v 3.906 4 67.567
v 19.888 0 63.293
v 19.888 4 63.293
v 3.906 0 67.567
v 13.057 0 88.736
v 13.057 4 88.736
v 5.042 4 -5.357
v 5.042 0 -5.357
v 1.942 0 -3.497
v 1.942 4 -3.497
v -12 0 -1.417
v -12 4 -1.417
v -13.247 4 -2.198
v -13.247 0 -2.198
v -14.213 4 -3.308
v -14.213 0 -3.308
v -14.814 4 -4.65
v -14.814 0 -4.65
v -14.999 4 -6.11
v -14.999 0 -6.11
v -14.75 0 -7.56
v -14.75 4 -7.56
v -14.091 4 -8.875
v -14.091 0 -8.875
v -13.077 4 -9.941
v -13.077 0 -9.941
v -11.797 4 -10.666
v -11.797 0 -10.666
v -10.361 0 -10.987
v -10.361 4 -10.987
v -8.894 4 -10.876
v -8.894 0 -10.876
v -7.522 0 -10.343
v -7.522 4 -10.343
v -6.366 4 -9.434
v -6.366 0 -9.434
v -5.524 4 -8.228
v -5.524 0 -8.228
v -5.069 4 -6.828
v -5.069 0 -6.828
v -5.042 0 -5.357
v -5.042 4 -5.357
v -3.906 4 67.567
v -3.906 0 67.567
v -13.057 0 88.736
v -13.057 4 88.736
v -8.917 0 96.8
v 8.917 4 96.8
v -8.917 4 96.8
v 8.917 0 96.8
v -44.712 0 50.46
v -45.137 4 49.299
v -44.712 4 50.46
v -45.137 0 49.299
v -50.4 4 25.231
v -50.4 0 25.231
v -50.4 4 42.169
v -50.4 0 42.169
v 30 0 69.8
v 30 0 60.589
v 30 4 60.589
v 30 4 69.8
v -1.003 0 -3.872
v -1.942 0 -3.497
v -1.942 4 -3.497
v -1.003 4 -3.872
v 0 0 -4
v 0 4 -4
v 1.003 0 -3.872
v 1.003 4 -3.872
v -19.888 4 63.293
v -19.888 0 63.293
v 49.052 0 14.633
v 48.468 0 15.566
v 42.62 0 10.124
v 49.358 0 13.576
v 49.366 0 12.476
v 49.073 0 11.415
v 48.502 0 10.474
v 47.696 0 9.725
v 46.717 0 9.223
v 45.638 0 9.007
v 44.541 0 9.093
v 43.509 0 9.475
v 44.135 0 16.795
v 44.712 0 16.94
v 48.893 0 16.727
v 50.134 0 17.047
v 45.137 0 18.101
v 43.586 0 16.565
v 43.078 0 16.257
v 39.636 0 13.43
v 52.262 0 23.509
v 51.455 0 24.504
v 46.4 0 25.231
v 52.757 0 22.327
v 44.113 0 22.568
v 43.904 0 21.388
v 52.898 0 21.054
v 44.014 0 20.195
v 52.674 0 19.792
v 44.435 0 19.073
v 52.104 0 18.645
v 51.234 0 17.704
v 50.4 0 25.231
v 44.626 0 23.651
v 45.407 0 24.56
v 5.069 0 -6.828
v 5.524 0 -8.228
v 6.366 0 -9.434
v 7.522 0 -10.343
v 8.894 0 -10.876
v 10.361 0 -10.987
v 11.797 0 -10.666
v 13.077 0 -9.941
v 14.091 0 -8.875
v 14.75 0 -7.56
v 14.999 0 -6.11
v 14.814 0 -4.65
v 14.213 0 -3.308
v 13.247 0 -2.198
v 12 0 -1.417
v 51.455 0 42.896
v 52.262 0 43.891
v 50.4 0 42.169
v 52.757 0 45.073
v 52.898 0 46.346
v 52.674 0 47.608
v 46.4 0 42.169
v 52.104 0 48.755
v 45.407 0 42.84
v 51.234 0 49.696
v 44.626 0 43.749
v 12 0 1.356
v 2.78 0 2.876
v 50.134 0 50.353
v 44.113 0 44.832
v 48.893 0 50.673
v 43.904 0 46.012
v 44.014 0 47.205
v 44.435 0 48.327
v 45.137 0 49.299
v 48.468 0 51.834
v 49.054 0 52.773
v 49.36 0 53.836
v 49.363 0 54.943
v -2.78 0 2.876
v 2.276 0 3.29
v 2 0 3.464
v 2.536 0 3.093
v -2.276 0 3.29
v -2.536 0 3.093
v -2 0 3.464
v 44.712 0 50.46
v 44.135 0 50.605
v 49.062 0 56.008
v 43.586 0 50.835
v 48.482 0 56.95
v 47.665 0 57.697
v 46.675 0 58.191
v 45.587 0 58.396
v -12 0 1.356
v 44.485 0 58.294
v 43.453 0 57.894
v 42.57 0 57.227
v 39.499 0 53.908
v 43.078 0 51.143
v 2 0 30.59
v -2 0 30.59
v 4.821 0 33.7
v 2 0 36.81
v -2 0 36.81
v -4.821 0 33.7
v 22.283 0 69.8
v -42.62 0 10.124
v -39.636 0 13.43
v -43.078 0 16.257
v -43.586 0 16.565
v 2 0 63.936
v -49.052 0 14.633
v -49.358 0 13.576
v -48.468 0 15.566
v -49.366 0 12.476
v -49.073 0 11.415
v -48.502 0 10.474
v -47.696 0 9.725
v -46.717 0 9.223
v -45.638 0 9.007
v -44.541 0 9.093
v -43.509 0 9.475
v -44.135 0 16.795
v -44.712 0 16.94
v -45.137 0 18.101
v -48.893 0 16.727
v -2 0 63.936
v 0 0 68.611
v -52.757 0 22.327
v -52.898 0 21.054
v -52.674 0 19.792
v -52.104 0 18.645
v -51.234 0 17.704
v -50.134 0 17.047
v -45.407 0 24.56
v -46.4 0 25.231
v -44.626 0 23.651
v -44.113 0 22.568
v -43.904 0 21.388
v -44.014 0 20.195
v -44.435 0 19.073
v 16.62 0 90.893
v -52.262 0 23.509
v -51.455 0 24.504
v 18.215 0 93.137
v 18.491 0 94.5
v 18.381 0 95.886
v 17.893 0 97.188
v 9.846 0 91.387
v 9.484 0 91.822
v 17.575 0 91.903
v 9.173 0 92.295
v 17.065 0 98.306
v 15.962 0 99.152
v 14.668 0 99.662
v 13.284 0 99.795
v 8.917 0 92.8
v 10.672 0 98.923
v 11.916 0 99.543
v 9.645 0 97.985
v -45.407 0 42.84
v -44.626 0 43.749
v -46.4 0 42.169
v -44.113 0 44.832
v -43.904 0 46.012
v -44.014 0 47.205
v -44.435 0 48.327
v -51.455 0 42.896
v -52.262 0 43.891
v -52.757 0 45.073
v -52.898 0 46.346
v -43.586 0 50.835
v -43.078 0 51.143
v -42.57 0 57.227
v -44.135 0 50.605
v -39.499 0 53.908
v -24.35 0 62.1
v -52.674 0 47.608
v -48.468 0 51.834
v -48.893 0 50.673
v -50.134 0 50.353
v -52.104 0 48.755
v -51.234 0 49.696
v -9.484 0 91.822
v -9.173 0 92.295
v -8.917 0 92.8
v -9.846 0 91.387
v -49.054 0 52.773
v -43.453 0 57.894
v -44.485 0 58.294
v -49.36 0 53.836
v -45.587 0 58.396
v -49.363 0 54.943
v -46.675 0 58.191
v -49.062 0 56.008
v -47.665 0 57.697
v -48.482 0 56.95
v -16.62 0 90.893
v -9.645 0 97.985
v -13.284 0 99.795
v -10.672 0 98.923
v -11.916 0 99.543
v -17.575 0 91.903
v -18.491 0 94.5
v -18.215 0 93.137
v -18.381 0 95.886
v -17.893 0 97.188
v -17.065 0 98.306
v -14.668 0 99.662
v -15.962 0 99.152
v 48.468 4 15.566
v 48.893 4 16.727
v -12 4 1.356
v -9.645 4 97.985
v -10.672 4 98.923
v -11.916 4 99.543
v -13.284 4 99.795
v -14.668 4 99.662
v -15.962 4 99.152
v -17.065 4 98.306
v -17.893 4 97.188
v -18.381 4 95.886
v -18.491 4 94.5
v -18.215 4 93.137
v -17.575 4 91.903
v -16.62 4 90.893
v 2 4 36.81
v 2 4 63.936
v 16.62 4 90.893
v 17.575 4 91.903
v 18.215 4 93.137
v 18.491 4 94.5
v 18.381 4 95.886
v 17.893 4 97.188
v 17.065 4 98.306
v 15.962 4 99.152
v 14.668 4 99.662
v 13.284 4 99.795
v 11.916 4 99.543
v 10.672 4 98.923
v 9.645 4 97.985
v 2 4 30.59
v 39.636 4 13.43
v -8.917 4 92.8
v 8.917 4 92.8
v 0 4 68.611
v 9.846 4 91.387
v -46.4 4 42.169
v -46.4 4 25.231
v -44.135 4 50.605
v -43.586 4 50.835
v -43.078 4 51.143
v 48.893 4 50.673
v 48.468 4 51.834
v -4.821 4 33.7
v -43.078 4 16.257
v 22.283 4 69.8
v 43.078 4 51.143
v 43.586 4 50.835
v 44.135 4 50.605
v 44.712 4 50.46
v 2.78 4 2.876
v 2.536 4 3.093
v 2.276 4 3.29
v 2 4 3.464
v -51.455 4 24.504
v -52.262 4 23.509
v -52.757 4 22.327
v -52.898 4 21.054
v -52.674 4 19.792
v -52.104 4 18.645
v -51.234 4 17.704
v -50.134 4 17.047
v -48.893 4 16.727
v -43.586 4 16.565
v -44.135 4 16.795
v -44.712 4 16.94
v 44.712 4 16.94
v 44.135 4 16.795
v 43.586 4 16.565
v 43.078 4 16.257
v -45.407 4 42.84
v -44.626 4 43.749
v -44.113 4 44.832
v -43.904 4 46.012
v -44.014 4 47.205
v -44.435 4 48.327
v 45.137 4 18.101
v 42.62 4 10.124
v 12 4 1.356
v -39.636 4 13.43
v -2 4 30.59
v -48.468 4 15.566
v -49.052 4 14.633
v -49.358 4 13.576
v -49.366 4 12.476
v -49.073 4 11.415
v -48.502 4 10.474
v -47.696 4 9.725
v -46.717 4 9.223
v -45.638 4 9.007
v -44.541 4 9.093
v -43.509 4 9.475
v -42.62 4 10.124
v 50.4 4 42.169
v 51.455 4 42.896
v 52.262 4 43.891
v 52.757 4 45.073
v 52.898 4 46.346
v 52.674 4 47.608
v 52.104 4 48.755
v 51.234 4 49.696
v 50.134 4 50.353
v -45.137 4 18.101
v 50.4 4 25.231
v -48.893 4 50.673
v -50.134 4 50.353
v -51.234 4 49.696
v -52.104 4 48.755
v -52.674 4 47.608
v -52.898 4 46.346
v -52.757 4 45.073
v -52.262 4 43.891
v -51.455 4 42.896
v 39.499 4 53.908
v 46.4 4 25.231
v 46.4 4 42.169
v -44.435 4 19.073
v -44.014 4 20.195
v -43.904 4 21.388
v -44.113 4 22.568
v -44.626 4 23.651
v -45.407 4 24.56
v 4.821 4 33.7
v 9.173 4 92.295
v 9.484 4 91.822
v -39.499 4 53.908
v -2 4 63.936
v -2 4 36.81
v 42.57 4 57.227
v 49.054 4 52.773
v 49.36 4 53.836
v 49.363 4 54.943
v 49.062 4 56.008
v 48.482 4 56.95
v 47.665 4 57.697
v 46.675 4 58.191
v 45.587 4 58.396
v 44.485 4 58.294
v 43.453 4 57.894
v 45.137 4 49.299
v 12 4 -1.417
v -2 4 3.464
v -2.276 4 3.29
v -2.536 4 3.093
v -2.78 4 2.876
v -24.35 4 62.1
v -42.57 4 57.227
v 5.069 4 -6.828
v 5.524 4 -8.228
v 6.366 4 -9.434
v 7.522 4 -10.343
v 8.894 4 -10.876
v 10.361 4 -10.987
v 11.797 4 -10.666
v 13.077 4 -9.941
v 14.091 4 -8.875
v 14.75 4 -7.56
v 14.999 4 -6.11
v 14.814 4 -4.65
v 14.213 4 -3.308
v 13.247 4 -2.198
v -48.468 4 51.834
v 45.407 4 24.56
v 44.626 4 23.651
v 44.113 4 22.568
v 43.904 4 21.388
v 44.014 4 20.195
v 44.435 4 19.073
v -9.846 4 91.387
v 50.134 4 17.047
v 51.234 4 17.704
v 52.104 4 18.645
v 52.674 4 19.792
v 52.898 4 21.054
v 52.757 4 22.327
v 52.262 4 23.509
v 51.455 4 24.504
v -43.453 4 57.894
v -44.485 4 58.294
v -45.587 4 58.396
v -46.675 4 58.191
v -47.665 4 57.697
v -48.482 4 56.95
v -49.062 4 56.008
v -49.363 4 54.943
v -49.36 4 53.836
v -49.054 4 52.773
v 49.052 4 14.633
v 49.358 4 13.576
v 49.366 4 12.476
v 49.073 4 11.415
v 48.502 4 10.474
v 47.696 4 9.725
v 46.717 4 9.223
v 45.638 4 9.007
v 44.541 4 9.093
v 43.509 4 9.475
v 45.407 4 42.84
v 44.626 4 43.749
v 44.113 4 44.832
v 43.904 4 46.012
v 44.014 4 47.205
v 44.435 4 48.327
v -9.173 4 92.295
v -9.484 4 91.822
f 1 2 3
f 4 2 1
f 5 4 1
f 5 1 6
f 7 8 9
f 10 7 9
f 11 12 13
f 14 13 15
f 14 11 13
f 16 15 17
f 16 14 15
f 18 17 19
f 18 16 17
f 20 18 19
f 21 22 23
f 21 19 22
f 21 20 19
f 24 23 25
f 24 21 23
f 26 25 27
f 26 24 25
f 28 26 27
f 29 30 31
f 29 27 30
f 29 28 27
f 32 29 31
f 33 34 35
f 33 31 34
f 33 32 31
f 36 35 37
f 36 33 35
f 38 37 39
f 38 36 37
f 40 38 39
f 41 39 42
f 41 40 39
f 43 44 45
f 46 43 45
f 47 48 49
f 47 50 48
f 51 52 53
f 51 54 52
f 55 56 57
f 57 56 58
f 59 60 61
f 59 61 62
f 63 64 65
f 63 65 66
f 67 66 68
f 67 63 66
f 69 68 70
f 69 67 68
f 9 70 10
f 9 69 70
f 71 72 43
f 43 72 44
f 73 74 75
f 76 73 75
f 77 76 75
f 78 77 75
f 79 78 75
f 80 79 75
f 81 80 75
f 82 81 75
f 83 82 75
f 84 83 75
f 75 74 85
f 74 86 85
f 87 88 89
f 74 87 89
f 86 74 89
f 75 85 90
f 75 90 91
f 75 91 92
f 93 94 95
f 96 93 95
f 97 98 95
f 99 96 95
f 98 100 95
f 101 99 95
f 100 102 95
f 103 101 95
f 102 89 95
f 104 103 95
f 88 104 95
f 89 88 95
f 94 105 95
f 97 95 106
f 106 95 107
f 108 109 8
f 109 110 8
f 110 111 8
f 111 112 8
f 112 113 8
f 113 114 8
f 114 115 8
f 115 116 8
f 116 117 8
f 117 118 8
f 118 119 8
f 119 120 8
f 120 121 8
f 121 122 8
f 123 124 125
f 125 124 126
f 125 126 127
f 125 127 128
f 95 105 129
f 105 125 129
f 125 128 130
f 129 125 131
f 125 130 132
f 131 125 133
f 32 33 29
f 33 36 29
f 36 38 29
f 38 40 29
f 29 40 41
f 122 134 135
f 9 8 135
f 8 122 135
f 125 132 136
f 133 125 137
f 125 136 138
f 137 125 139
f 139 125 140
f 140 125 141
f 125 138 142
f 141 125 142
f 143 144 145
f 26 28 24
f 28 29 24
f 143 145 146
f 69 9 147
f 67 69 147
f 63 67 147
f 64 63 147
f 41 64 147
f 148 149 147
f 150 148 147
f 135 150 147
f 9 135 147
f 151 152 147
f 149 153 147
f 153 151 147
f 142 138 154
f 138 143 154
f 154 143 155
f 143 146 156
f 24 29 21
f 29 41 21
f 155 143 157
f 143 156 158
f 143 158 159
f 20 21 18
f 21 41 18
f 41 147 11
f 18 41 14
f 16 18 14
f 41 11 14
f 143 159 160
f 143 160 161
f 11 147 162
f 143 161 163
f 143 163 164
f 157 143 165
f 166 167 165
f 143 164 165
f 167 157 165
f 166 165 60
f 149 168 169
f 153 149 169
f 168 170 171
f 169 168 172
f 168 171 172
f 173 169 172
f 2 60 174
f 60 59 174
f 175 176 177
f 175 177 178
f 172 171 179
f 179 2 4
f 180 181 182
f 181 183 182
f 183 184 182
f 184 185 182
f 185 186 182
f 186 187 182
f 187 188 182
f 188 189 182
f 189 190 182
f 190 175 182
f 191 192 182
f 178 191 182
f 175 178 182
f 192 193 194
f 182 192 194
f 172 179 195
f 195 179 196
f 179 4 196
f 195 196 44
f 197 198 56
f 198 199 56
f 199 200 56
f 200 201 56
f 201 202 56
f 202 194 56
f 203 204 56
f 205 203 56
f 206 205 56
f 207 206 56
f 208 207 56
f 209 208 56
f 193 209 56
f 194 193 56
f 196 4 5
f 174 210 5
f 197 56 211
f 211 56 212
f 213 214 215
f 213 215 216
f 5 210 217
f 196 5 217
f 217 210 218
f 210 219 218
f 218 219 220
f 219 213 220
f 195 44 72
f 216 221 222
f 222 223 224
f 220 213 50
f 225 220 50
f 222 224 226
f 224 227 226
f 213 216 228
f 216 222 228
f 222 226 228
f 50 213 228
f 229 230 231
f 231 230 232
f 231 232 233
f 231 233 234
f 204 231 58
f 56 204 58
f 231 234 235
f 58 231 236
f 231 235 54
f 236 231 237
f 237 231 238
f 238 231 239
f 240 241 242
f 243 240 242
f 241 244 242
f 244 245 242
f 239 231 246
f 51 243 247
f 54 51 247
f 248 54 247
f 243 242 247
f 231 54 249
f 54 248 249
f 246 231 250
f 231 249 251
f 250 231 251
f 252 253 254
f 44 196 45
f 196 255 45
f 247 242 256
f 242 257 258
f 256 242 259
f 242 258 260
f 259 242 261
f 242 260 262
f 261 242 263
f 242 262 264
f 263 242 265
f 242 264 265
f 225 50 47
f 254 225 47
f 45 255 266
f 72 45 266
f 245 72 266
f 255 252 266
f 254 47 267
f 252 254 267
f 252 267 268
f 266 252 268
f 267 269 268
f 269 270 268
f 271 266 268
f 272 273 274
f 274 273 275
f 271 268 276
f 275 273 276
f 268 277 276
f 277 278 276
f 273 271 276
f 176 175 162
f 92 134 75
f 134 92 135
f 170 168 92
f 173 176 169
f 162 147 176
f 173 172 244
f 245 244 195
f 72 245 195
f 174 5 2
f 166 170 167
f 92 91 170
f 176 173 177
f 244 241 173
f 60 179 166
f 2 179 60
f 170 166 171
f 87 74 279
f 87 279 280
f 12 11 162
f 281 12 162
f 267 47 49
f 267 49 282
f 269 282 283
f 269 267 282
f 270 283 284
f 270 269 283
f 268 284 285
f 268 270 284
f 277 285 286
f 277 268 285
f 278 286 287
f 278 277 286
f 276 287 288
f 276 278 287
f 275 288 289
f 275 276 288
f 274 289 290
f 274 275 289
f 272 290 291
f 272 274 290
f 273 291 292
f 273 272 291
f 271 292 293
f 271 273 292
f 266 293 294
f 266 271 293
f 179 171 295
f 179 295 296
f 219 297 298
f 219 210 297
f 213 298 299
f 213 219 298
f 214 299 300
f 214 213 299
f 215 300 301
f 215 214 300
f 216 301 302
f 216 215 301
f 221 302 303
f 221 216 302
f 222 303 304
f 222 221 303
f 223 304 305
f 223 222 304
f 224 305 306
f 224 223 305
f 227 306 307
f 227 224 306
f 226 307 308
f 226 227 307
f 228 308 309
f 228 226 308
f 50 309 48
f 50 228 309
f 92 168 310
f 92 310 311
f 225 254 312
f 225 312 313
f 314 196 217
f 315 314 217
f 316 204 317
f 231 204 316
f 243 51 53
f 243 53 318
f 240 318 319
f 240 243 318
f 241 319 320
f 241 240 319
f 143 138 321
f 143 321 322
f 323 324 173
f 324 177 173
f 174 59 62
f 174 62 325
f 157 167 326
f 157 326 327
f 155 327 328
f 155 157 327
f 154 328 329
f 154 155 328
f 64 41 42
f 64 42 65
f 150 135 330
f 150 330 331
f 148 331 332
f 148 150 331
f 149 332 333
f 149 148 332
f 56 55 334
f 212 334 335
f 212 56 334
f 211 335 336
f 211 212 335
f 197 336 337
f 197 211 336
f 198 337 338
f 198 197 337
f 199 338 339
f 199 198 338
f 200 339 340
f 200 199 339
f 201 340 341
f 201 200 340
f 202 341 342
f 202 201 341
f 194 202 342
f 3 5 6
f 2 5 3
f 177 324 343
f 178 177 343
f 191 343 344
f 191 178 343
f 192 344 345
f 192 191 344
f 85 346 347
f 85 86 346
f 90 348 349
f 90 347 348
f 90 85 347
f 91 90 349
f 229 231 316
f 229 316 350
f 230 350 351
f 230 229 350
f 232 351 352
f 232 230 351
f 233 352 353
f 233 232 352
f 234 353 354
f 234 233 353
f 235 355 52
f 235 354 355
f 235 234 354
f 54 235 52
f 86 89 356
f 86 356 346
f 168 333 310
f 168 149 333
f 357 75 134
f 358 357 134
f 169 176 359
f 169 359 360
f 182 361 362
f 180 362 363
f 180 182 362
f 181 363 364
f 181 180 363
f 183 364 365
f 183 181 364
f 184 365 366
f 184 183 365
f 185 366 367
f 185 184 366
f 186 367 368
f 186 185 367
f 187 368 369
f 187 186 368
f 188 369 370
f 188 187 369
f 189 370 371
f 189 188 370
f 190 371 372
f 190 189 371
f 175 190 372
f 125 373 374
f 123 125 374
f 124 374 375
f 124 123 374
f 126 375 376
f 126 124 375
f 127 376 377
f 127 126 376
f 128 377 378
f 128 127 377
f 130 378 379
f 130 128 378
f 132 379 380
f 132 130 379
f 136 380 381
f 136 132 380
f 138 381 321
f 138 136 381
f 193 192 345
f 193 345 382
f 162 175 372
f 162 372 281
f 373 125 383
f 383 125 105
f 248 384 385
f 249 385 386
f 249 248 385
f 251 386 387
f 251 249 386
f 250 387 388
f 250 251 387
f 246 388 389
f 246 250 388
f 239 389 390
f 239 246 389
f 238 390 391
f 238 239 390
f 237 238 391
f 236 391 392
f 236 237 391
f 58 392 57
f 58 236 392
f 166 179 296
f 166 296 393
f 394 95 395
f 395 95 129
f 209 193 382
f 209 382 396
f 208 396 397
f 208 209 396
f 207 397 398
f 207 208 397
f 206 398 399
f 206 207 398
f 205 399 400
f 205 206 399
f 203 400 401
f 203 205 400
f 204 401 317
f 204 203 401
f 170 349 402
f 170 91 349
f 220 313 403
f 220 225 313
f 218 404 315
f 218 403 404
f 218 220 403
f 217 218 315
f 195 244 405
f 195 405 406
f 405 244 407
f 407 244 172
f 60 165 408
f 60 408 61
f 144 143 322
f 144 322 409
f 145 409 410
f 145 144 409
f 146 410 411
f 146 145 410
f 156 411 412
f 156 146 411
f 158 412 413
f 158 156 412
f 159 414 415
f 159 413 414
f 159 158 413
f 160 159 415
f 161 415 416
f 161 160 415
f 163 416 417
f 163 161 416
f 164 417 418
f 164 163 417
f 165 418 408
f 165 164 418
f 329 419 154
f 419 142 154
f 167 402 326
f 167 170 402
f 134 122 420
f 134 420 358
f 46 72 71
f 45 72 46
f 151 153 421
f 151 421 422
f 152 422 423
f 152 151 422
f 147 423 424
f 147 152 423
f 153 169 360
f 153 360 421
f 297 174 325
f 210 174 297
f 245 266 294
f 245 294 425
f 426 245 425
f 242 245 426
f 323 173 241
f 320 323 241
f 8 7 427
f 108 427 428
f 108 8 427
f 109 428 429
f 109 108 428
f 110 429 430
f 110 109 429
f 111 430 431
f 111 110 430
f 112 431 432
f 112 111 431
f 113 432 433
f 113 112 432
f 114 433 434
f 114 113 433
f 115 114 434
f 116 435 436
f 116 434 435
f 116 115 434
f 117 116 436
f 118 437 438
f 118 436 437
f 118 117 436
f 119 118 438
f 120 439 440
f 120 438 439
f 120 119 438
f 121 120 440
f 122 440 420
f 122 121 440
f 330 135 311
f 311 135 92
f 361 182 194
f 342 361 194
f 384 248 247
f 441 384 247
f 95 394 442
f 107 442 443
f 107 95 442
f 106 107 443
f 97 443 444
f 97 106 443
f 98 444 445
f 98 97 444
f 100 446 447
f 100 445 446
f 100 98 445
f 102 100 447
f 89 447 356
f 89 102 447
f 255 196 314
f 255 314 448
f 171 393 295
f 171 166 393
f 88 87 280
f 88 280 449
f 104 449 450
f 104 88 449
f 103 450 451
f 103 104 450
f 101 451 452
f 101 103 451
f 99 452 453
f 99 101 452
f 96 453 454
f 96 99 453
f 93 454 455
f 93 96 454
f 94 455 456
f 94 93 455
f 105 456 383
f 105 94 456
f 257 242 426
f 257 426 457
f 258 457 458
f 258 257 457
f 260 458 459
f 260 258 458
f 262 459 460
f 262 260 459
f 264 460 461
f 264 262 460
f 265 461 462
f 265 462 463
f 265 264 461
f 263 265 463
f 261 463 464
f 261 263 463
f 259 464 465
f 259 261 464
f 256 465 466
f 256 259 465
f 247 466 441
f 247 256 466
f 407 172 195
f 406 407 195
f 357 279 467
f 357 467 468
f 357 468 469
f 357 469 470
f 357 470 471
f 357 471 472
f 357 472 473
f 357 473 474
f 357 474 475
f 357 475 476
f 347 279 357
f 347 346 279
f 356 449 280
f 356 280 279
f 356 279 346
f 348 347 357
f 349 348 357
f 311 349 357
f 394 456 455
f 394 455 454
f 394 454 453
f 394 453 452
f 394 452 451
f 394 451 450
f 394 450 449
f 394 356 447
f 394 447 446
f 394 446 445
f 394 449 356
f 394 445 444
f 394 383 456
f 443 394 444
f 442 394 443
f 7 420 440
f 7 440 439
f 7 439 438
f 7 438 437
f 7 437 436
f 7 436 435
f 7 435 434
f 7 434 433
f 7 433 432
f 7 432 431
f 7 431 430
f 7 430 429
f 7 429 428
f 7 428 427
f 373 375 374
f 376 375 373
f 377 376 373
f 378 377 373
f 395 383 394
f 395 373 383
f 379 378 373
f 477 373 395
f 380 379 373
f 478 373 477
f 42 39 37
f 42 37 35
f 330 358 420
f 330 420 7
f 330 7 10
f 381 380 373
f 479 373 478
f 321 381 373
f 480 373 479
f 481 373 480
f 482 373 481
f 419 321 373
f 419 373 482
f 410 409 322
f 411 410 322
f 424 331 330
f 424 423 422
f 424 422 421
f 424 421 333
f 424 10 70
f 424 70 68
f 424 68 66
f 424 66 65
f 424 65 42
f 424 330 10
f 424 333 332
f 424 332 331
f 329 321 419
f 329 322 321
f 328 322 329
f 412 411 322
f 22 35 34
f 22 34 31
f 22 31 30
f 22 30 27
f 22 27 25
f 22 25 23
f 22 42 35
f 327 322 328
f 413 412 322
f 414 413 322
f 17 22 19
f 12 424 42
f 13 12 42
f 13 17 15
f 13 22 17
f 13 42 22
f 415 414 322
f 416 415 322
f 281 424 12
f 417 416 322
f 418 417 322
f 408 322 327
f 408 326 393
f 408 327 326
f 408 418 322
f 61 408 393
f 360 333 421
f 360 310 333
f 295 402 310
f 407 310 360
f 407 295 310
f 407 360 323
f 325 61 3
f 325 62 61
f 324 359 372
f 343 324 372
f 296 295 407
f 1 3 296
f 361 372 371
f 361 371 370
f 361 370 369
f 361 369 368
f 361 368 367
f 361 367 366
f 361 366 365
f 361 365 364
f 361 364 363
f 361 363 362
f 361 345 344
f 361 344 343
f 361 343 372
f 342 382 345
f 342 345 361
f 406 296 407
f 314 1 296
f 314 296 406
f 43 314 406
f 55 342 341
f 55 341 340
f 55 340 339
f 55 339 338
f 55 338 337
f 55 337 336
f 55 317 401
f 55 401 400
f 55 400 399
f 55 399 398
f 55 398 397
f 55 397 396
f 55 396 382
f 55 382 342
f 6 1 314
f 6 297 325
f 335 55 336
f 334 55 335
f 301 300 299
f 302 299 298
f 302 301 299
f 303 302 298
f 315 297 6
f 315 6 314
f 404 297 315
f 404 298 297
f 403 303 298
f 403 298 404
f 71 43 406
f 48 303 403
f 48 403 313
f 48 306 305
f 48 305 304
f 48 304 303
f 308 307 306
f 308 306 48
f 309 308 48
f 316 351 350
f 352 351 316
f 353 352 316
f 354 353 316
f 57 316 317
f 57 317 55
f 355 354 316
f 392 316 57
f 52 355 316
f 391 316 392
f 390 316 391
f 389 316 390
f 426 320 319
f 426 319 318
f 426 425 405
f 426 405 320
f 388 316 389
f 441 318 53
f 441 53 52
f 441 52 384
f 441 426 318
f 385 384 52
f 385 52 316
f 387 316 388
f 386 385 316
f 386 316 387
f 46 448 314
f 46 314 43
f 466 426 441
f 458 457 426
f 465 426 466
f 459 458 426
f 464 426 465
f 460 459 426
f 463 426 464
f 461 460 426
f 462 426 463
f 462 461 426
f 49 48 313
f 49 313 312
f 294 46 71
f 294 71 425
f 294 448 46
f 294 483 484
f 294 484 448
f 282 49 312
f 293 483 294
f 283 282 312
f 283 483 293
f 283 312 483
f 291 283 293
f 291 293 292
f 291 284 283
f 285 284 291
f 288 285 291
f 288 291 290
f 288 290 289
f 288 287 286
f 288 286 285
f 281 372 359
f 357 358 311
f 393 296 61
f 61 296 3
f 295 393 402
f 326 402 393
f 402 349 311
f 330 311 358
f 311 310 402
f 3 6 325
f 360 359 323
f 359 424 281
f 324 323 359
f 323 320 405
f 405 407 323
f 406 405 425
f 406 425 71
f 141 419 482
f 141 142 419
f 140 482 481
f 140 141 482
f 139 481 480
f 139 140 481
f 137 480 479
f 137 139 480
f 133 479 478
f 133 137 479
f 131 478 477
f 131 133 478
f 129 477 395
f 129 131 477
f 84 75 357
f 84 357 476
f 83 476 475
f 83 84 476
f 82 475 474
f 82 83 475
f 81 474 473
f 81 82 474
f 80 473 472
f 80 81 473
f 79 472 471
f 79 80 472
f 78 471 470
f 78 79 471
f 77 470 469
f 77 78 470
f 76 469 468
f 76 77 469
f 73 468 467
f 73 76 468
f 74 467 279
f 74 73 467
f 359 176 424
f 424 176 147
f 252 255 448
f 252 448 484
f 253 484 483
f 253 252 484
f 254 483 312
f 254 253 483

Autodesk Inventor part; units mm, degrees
ref_plane "YZ Plane" through (0, 0, 0) normal (1, 0, 0) x (0, 1, 0)
ref_plane "XZ Plane" through (0, 0, 0) normal (0, 1, 0) x (-1, 0, 0)
ref_plane "XY Plane" through (0, 0, 0) normal (0, 0, 1) x (1, 0, 0)
sketch "Sketch1" plane through (0, 0, 0) normal (0, 1, 0) x (-1, 0, 0)
  circle A0 centre (30.4866, -33.5844) radius 1.55
  circle A1 centre (30.4866, -82.5844) radius 1.55
  circle A2 centre (-31.5134, -77.3344) radius 1.55
  circle A3 centre (-31.5134, -38.8344) radius 1.55
  circle A4 centre (30.4866, -33.5844) radius 5
  circle A5 centre (30.4866, -82.5844) radius 5
  circle A6 centre (-31.5134, -77.3344) radius 5
  circle A7 centre (-31.5134, -38.8344) radius 5
  line L0 (43, 55.7856) -> (45.4, 57.1713)
  line L1 (45.4, 57.1713) -> (47.8, 55.7856)
  line L2 (47.8, 55.7856) -> (47.8, 53.0144)
  line L3 (47.8, 53.0144) -> (45.4, 51.6287)
  line L4 (45.4, 51.6287) -> (43, 53.0144)
  line L5 (43, 53.0144) -> (43, 55.7856)
  line L6 (47.8, 14.3856) -> (47.8, 11.6144)
  line L7 (47.8, 11.6144) -> (45.4, 10.2287)
  line L8 (45.4, 10.2287) -> (43, 11.6144)
  line L9 (43, 11.6144) -> (43, 14.3856)
  line L10 (43, 14.3856) -> (45.4, 15.7713)
  line L11 (45.4, 15.7713) -> (47.8, 14.3856)
  line L12 (-43, 55.7856) -> (-43, 53.0144)
  line L13 (-43, 53.0144) -> (-45.4, 51.6287)
  line L14 (-45.4, 51.6287) -> (-47.8, 53.0144)
  line L15 (-47.8, 53.0144) -> (-47.8, 55.7856)
  line L16 (-47.8, 55.7856) -> (-45.4, 57.1713)
  line L17 (-45.4, 57.1713) -> (-43, 55.7856)
  line L18 (-1.3856, 2.4) -> (1.3856, 2.4)
  line L19 (1.3856, 2.4) -> (2.7713, 0)
  line L20 (2.7713, 0) -> (1.3856, -2.4)
  line L21 (1.3856, -2.4) -> (-1.3856, -2.4)
  line L22 (-1.3856, -2.4) -> (-2.7713, 0)
  line L23 (-2.7713, 0) -> (-1.3856, 2.4)
  line L24 (-45.4, 15.7713) -> (-43, 14.3856)
  line L25 (-43, 14.3856) -> (-43, 11.6144)
  line L26 (-43, 11.6144) -> (-45.4, 10.2287)
  line L27 (-45.4, 10.2287) -> (-47.8, 11.6144)
  line L28 (-47.8, 11.6144) -> (-47.8, 14.3856)
  line L29 (-47.8, 14.3856) -> (-45.4, 15.7713)
  circle A8 centre (45.4, 54.4) radius 4
  circle A9 centre (-45.4, 54.4) radius 4
  circle A10 centre (45.4, 13) radius 4
  circle A11 centre (-45.4, 13) radius 4
  circle A12 centre (0, 0) radius 4
  line L30 (43.0778, 16.2569) -> (4.8209, 33.7)
  line L31 (4.8209, 33.7) -> (43.0778, 51.1431)
  line L32 (41.4183, 54.7827) -> (2, 36.81)
  line L33 (2, 36.81) -> (2, 63.9359)
  line L34 (41.4183, 12.6173) -> (2, 30.59)
  line L35 (2, 30.59) -> (2, 3.4641)
  line L36 (-2, 3.4641) -> (-2, 30.59)
  line L37 (-2, 30.59) -> (-41.4183, 12.6173)
  line L38 (-43.0778, 16.2569) -> (-4.8209, 33.7)
  line L39 (-4.8209, 33.7) -> (-43.0778, 51.1431)
  line L40 (-41.4183, 54.7827) -> (-2, 36.81)
  line L41 (-2, 36.81) -> (-2, 63.9359)
  line L42 (42.6203, 10.1237) -> (3.8808, -0.9691)
  line L43 (-2.7797, 2.8763) -> (-41.5192, 13.9691)
  line L44 (-42.6203, 10.1237) -> (-3.8808, -0.9691)
  line L45 (41.5192, 13.9691) -> (2.7797, 2.8763)
  line L46 (46.7546, 43.35) -> (45.1091, 46.2)
  line L47 (45.1091, 46.2) -> (46.7546, 49.05)
  line L48 (46.7546, 49.05) -> (50.0454, 49.05)
  line L49 (50.0454, 49.05) -> (51.6909, 46.2)
  line L50 (51.6909, 46.2) -> (50.0454, 43.35)
  line L51 (50.0454, 43.35) -> (46.7546, 43.35)
  line L52 (46.7546, 24.05) -> (50.0454, 24.05)
  line L53 (50.0454, 24.05) -> (51.6909, 21.2)
  line L54 (51.6909, 21.2) -> (50.0454, 18.35)
  line L55 (50.0454, 18.35) -> (46.7546, 18.35)
  line L56 (46.7546, 18.35) -> (45.1091, 21.2)
  line L57 (45.1091, 21.2) -> (46.7546, 24.05)
  line L58 (-51.6909, 21.2) -> (-50.0454, 24.05)
  line L59 (-50.0454, 24.05) -> (-46.7546, 24.05)
  line L60 (-46.7546, 24.05) -> (-45.1091, 21.2)
  line L61 (-45.1091, 21.2) -> (-46.7546, 18.35)
  line L62 (-46.7546, 18.35) -> (-50.0454, 18.35)
  line L63 (-50.0454, 18.35) -> (-51.6909, 21.2)
  line L64 (-51.6909, 46.2) -> (-50.0454, 49.05)
  line L65 (-50.0454, 49.05) -> (-46.7546, 49.05)
  line L66 (-46.7546, 49.05) -> (-45.1091, 46.2)
  line L67 (-45.1091, 46.2) -> (-46.7546, 43.35)
  line L68 (-46.7546, 43.35) -> (-50.0454, 43.35)
  line L69 (-50.0454, 43.35) -> (-51.6909, 46.2)
  line L70 (41.5368, 53.3628) -> (2, 63.9359)
  line L71 (-2, 63.9359) -> (-41.5368, 53.3628)
  line L72 (-42.5702, 57.227) -> (-30, 60.5886)
  line L73 (-30, 60.5886) -> (-30, 69.8)
  line L74 (-30, 69.8) -> (-22.2827, 69.8)
  line L75 (-22.2827, 69.8) -> (-16.6198, 90.8927)
  line L76 (16.6198, 90.8927) -> (24.3501, 62.0995)
  line L77 (24.3501, 62.0995) -> (42.5702, 57.227)
  line L78 (-11.8546, 91.95) -> (-15.1454, 91.95)
  line L79 (-15.1454, 91.95) -> (-16.7909, 94.8)
  line L80 (-16.7909, 94.8) -> (-15.1454, 97.65)
  line L81 (-15.1454, 97.65) -> (-11.8546, 97.65)
  line L82 (-11.8546, 97.65) -> (-10.2091, 94.8)
  line L83 (-10.2091, 94.8) -> (-11.8546, 91.95)
  line L84 (16.7909, 94.8) -> (15.1454, 91.95)
  line L85 (15.1454, 91.95) -> (11.8546, 91.95)
  line L86 (11.8546, 91.95) -> (10.2091, 94.8)
  line L87 (10.2091, 94.8) -> (11.8546, 97.65)
  line L88 (11.8546, 97.65) -> (15.1454, 97.65)
  line L89 (15.1454, 97.65) -> (16.7909, 94.8)
  line L90 (19.8881, 63.2928) -> (12.7566, 89.8556)
  line L91 (-12.7566, 89.8556) -> (-19.8881, 63.2928)
  line L92 (-19.8881, 63.2928) -> (-3.9062, 67.5667)
  line L93 (-3.9062, 67.5667) -> (-13.5174, 89.8)
  line L94 (19.8881, 63.2928) -> (3.9062, 67.5667)
  line L95 (3.9062, 67.5667) -> (13.5174, 89.8)
  line L96 (0, 68.6113) -> (9.8458, 91.3872)
  line L97 (0, 68.6113) -> (-9.8458, 91.3872)
  circle A13 centre (48.4, 21.2) radius 4.5
  circle A14 centre (48.4, 46.2) radius 4.5
  circle A15 centre (-48.4, 46.2) radius 4.5
  circle A16 centre (-48.4, 21.2) radius 4.5
  line L98 (50.4, 25.2311) -> (50.4, 42.1689)
  line L99 (46.4, 25.2311) -> (46.4, 42.1689)
  line L100 (48.4684, 15.5661) -> (48.8932, 16.7271)
  line L101 (44.712, 16.9404) -> (45.1367, 18.1014)
  line L102 (48.8932, 50.6729) -> (48.4684, 51.8339)
  line L103 (45.1367, 49.2986) -> (44.712, 50.4596)
  line L104 (-48.8932, 50.6729) -> (-48.4684, 51.8339)
  line L105 (-46.4, 25.2311) -> (-46.4, 42.1689)
  line L106 (-50.4, 42.1689) -> (-50.4, 25.2311)
  line L107 (-45.1367, 18.1014) -> (-44.712, 16.9404)
  line L108 (-48.4684, 15.5661) -> (-48.8932, 16.7271)
  line L109 (-45.1367, 49.2986) -> (-44.712, 50.4596)
  circle A17 centre (13.5, 94.8) radius 5
  circle A18 centre (-13.5, 94.8) radius 5
  line L110 (8.9174, 92.8) -> (-8.9174, 92.8)
  line L111 (-8.9174, 96.8) -> (8.9174, 96.8)
  line L112 (8.3546, -8.85) -> (6.7091, -6)
  line L113 (6.7091, -6) -> (8.3546, -3.15)
  line L114 (8.3546, -3.15) -> (11.6454, -3.15)
  line L115 (11.6454, -3.15) -> (13.2909, -6)
  line L116 (13.2909, -6) -> (11.6454, -8.85)
  line L117 (11.6454, -8.85) -> (8.3546, -8.85)
  line L118 (-11.6454, -3.15) -> (-8.3546, -3.15)
  line L119 (-8.3546, -3.15) -> (-6.7091, -6)
  line L120 (-6.7091, -6) -> (-8.3546, -8.85)
  line L121 (-8.3546, -8.85) -> (-11.6454, -8.85)
  line L122 (-11.6454, -8.85) -> (-13.2909, -6)
  line L123 (-13.2909, -6) -> (-11.6454, -3.15)
  circle A19 centre (10, -6) radius 5
  circle A20 centre (-10, -6) radius 5
  line L124 (5.0415, -5.3573) -> (1.9415, -3.4973)
  line L125 (-5.0415, -5.3573) -> (-1.9415, -3.4973)
  line L126 (-12, -1.4174) -> (-12, 1.3557)
  line L127 (12, -1.4174) -> (12, 1.3557)
  point P0 (0, 92.8)
  point P1 (-39.6361, 13.4299)
  point P2 (-13.0573, 88.7356)
  point P3 (13.0573, 88.7356)
  point P4 (-39.4993, 53.9077)
  point P5 (39.6361, 13.4299)
  point P6 (39.4993, 53.9077)
  dimension "d37" = 8
  dimension "d1" = 3.1
  dimension "d2" = 49
  dimension "d3" = 62
  dimension "d5" = 5.25
  dimension "d6" = 5.25
  dimension "d7" = 10
  dimension "d13" = 13
  dimension "d14" = 90.8
  dimension "d15" = 45.4
  dimension "d17" = 4
  dimension "d18" = 4
  dimension "d19" = 4
  dimension "d20" = 2
  dimension "d21" = 2
  dimension "d22" = 2
  dimension "d23" = 2
  dimension "d24" = 2
  dimension "d25" = 4
  dimension "d26" = 2
  dimension "d27" = 2
  dimension "d30" = 4
  dimension "d31" = 2
  dimension "d32" = 2
  dimension "d35" = 5.7
  dimension "d36" = 25
  dimension "d38" = 4.8
  dimension "d39" = 69.8
  dimension "d40" = 15.4
  dimension "d41" = 4
  dimension "d42" = 4
  dimension "d43" = 2
  dimension "d44" = 2
  dimension "d48" = 30
  dimension "d49" = 27
  dimension "d51" = 3
  dimension "d52" = 3
  dimension "d53" = 4
  dimension "d55" = 4
  dimension "d56" = 4
  dimension "d57" = 4
  dimension "d65" = 8.2
  dimension "d66" = 9
  dimension "d67" = 4
  dimension "d68" = 2
  dimension "d69" = 4
  dimension "d70" = 2
  dimension "d71" = 2
  dimension "d72" = 4
  dimension "d73" = 2
  dimension "d74" = 2
  dimension "d75" = 4
  dimension "d76" = 2
  dimension "d77" = 2
  dimension "d78" = 4
  dimension "d79" = 2
  dimension "d80" = 4
  dimension "d81" = 2
  dimension "d82" = 10
  dimension "d83" = 4
  dimension "d84" = 2
  dimension "d85" = 27
  dimension "d86" = 2
  dimension "d87" = 2
  dimension "d88" = 2
extrude "Extrusion1" add sketch "Sketch1" along normal blind 4 contours L0 L1 L2 L3 L4 L5 | L6 L7 L8 L9 L10 L11 | L12 L13 L14 L15 L16 L17 | L18 L19 L20 L21 L22 L23 | L24 L25 L26 L27 L28 L29 | A8 | A8 L32 L70 L31 L30 A10 L45 L34 L35 A12 L36 L37 L43 A11 L38 L39 A9 L71 L40 L72 L73 L74 L75 A18 L93 L91 L97 L96 A17 L90 L95 L76 L77 | L102 A14 L103 A8 | A8 L70 L32 | A14 | A17 | L95 L90 A17 | A14 L98 A13 L99 | A17 L110 A18 L111 | A10 | A13 | A18 | L101 A13 L100 A10 | A10 L34 L45 | A10 L42 A12 L45 L34 | A18 L91 L93 | A12 | L127 A19 L124 A12 L42 | A19 | A9 | A12 L44 A11 L37 L43 | L40 L71 A9 | A9 L109 A15 L104 | L125 A20 L126 L44 A12 | L37 A11 L43 | A15 | A20 | A11 | A15 L105 A16 L106 | A16 | L108 A16 L107 A11 | L46 L47 L48 L49 L50 L51 | L52 L53 L54 L55 L56 L57 | L58 L59 L60 L61 L62 L63 | L64 L65 L66 L67 L68 L69 | L78 L79 L80 L81 L82 L83 | L84 L85 L86 L87 L88 L89 | L112 L113 L114 L115 L116 L117 | L118 L119 L120 L121 L122 L123
properties part number "v2chassis"
